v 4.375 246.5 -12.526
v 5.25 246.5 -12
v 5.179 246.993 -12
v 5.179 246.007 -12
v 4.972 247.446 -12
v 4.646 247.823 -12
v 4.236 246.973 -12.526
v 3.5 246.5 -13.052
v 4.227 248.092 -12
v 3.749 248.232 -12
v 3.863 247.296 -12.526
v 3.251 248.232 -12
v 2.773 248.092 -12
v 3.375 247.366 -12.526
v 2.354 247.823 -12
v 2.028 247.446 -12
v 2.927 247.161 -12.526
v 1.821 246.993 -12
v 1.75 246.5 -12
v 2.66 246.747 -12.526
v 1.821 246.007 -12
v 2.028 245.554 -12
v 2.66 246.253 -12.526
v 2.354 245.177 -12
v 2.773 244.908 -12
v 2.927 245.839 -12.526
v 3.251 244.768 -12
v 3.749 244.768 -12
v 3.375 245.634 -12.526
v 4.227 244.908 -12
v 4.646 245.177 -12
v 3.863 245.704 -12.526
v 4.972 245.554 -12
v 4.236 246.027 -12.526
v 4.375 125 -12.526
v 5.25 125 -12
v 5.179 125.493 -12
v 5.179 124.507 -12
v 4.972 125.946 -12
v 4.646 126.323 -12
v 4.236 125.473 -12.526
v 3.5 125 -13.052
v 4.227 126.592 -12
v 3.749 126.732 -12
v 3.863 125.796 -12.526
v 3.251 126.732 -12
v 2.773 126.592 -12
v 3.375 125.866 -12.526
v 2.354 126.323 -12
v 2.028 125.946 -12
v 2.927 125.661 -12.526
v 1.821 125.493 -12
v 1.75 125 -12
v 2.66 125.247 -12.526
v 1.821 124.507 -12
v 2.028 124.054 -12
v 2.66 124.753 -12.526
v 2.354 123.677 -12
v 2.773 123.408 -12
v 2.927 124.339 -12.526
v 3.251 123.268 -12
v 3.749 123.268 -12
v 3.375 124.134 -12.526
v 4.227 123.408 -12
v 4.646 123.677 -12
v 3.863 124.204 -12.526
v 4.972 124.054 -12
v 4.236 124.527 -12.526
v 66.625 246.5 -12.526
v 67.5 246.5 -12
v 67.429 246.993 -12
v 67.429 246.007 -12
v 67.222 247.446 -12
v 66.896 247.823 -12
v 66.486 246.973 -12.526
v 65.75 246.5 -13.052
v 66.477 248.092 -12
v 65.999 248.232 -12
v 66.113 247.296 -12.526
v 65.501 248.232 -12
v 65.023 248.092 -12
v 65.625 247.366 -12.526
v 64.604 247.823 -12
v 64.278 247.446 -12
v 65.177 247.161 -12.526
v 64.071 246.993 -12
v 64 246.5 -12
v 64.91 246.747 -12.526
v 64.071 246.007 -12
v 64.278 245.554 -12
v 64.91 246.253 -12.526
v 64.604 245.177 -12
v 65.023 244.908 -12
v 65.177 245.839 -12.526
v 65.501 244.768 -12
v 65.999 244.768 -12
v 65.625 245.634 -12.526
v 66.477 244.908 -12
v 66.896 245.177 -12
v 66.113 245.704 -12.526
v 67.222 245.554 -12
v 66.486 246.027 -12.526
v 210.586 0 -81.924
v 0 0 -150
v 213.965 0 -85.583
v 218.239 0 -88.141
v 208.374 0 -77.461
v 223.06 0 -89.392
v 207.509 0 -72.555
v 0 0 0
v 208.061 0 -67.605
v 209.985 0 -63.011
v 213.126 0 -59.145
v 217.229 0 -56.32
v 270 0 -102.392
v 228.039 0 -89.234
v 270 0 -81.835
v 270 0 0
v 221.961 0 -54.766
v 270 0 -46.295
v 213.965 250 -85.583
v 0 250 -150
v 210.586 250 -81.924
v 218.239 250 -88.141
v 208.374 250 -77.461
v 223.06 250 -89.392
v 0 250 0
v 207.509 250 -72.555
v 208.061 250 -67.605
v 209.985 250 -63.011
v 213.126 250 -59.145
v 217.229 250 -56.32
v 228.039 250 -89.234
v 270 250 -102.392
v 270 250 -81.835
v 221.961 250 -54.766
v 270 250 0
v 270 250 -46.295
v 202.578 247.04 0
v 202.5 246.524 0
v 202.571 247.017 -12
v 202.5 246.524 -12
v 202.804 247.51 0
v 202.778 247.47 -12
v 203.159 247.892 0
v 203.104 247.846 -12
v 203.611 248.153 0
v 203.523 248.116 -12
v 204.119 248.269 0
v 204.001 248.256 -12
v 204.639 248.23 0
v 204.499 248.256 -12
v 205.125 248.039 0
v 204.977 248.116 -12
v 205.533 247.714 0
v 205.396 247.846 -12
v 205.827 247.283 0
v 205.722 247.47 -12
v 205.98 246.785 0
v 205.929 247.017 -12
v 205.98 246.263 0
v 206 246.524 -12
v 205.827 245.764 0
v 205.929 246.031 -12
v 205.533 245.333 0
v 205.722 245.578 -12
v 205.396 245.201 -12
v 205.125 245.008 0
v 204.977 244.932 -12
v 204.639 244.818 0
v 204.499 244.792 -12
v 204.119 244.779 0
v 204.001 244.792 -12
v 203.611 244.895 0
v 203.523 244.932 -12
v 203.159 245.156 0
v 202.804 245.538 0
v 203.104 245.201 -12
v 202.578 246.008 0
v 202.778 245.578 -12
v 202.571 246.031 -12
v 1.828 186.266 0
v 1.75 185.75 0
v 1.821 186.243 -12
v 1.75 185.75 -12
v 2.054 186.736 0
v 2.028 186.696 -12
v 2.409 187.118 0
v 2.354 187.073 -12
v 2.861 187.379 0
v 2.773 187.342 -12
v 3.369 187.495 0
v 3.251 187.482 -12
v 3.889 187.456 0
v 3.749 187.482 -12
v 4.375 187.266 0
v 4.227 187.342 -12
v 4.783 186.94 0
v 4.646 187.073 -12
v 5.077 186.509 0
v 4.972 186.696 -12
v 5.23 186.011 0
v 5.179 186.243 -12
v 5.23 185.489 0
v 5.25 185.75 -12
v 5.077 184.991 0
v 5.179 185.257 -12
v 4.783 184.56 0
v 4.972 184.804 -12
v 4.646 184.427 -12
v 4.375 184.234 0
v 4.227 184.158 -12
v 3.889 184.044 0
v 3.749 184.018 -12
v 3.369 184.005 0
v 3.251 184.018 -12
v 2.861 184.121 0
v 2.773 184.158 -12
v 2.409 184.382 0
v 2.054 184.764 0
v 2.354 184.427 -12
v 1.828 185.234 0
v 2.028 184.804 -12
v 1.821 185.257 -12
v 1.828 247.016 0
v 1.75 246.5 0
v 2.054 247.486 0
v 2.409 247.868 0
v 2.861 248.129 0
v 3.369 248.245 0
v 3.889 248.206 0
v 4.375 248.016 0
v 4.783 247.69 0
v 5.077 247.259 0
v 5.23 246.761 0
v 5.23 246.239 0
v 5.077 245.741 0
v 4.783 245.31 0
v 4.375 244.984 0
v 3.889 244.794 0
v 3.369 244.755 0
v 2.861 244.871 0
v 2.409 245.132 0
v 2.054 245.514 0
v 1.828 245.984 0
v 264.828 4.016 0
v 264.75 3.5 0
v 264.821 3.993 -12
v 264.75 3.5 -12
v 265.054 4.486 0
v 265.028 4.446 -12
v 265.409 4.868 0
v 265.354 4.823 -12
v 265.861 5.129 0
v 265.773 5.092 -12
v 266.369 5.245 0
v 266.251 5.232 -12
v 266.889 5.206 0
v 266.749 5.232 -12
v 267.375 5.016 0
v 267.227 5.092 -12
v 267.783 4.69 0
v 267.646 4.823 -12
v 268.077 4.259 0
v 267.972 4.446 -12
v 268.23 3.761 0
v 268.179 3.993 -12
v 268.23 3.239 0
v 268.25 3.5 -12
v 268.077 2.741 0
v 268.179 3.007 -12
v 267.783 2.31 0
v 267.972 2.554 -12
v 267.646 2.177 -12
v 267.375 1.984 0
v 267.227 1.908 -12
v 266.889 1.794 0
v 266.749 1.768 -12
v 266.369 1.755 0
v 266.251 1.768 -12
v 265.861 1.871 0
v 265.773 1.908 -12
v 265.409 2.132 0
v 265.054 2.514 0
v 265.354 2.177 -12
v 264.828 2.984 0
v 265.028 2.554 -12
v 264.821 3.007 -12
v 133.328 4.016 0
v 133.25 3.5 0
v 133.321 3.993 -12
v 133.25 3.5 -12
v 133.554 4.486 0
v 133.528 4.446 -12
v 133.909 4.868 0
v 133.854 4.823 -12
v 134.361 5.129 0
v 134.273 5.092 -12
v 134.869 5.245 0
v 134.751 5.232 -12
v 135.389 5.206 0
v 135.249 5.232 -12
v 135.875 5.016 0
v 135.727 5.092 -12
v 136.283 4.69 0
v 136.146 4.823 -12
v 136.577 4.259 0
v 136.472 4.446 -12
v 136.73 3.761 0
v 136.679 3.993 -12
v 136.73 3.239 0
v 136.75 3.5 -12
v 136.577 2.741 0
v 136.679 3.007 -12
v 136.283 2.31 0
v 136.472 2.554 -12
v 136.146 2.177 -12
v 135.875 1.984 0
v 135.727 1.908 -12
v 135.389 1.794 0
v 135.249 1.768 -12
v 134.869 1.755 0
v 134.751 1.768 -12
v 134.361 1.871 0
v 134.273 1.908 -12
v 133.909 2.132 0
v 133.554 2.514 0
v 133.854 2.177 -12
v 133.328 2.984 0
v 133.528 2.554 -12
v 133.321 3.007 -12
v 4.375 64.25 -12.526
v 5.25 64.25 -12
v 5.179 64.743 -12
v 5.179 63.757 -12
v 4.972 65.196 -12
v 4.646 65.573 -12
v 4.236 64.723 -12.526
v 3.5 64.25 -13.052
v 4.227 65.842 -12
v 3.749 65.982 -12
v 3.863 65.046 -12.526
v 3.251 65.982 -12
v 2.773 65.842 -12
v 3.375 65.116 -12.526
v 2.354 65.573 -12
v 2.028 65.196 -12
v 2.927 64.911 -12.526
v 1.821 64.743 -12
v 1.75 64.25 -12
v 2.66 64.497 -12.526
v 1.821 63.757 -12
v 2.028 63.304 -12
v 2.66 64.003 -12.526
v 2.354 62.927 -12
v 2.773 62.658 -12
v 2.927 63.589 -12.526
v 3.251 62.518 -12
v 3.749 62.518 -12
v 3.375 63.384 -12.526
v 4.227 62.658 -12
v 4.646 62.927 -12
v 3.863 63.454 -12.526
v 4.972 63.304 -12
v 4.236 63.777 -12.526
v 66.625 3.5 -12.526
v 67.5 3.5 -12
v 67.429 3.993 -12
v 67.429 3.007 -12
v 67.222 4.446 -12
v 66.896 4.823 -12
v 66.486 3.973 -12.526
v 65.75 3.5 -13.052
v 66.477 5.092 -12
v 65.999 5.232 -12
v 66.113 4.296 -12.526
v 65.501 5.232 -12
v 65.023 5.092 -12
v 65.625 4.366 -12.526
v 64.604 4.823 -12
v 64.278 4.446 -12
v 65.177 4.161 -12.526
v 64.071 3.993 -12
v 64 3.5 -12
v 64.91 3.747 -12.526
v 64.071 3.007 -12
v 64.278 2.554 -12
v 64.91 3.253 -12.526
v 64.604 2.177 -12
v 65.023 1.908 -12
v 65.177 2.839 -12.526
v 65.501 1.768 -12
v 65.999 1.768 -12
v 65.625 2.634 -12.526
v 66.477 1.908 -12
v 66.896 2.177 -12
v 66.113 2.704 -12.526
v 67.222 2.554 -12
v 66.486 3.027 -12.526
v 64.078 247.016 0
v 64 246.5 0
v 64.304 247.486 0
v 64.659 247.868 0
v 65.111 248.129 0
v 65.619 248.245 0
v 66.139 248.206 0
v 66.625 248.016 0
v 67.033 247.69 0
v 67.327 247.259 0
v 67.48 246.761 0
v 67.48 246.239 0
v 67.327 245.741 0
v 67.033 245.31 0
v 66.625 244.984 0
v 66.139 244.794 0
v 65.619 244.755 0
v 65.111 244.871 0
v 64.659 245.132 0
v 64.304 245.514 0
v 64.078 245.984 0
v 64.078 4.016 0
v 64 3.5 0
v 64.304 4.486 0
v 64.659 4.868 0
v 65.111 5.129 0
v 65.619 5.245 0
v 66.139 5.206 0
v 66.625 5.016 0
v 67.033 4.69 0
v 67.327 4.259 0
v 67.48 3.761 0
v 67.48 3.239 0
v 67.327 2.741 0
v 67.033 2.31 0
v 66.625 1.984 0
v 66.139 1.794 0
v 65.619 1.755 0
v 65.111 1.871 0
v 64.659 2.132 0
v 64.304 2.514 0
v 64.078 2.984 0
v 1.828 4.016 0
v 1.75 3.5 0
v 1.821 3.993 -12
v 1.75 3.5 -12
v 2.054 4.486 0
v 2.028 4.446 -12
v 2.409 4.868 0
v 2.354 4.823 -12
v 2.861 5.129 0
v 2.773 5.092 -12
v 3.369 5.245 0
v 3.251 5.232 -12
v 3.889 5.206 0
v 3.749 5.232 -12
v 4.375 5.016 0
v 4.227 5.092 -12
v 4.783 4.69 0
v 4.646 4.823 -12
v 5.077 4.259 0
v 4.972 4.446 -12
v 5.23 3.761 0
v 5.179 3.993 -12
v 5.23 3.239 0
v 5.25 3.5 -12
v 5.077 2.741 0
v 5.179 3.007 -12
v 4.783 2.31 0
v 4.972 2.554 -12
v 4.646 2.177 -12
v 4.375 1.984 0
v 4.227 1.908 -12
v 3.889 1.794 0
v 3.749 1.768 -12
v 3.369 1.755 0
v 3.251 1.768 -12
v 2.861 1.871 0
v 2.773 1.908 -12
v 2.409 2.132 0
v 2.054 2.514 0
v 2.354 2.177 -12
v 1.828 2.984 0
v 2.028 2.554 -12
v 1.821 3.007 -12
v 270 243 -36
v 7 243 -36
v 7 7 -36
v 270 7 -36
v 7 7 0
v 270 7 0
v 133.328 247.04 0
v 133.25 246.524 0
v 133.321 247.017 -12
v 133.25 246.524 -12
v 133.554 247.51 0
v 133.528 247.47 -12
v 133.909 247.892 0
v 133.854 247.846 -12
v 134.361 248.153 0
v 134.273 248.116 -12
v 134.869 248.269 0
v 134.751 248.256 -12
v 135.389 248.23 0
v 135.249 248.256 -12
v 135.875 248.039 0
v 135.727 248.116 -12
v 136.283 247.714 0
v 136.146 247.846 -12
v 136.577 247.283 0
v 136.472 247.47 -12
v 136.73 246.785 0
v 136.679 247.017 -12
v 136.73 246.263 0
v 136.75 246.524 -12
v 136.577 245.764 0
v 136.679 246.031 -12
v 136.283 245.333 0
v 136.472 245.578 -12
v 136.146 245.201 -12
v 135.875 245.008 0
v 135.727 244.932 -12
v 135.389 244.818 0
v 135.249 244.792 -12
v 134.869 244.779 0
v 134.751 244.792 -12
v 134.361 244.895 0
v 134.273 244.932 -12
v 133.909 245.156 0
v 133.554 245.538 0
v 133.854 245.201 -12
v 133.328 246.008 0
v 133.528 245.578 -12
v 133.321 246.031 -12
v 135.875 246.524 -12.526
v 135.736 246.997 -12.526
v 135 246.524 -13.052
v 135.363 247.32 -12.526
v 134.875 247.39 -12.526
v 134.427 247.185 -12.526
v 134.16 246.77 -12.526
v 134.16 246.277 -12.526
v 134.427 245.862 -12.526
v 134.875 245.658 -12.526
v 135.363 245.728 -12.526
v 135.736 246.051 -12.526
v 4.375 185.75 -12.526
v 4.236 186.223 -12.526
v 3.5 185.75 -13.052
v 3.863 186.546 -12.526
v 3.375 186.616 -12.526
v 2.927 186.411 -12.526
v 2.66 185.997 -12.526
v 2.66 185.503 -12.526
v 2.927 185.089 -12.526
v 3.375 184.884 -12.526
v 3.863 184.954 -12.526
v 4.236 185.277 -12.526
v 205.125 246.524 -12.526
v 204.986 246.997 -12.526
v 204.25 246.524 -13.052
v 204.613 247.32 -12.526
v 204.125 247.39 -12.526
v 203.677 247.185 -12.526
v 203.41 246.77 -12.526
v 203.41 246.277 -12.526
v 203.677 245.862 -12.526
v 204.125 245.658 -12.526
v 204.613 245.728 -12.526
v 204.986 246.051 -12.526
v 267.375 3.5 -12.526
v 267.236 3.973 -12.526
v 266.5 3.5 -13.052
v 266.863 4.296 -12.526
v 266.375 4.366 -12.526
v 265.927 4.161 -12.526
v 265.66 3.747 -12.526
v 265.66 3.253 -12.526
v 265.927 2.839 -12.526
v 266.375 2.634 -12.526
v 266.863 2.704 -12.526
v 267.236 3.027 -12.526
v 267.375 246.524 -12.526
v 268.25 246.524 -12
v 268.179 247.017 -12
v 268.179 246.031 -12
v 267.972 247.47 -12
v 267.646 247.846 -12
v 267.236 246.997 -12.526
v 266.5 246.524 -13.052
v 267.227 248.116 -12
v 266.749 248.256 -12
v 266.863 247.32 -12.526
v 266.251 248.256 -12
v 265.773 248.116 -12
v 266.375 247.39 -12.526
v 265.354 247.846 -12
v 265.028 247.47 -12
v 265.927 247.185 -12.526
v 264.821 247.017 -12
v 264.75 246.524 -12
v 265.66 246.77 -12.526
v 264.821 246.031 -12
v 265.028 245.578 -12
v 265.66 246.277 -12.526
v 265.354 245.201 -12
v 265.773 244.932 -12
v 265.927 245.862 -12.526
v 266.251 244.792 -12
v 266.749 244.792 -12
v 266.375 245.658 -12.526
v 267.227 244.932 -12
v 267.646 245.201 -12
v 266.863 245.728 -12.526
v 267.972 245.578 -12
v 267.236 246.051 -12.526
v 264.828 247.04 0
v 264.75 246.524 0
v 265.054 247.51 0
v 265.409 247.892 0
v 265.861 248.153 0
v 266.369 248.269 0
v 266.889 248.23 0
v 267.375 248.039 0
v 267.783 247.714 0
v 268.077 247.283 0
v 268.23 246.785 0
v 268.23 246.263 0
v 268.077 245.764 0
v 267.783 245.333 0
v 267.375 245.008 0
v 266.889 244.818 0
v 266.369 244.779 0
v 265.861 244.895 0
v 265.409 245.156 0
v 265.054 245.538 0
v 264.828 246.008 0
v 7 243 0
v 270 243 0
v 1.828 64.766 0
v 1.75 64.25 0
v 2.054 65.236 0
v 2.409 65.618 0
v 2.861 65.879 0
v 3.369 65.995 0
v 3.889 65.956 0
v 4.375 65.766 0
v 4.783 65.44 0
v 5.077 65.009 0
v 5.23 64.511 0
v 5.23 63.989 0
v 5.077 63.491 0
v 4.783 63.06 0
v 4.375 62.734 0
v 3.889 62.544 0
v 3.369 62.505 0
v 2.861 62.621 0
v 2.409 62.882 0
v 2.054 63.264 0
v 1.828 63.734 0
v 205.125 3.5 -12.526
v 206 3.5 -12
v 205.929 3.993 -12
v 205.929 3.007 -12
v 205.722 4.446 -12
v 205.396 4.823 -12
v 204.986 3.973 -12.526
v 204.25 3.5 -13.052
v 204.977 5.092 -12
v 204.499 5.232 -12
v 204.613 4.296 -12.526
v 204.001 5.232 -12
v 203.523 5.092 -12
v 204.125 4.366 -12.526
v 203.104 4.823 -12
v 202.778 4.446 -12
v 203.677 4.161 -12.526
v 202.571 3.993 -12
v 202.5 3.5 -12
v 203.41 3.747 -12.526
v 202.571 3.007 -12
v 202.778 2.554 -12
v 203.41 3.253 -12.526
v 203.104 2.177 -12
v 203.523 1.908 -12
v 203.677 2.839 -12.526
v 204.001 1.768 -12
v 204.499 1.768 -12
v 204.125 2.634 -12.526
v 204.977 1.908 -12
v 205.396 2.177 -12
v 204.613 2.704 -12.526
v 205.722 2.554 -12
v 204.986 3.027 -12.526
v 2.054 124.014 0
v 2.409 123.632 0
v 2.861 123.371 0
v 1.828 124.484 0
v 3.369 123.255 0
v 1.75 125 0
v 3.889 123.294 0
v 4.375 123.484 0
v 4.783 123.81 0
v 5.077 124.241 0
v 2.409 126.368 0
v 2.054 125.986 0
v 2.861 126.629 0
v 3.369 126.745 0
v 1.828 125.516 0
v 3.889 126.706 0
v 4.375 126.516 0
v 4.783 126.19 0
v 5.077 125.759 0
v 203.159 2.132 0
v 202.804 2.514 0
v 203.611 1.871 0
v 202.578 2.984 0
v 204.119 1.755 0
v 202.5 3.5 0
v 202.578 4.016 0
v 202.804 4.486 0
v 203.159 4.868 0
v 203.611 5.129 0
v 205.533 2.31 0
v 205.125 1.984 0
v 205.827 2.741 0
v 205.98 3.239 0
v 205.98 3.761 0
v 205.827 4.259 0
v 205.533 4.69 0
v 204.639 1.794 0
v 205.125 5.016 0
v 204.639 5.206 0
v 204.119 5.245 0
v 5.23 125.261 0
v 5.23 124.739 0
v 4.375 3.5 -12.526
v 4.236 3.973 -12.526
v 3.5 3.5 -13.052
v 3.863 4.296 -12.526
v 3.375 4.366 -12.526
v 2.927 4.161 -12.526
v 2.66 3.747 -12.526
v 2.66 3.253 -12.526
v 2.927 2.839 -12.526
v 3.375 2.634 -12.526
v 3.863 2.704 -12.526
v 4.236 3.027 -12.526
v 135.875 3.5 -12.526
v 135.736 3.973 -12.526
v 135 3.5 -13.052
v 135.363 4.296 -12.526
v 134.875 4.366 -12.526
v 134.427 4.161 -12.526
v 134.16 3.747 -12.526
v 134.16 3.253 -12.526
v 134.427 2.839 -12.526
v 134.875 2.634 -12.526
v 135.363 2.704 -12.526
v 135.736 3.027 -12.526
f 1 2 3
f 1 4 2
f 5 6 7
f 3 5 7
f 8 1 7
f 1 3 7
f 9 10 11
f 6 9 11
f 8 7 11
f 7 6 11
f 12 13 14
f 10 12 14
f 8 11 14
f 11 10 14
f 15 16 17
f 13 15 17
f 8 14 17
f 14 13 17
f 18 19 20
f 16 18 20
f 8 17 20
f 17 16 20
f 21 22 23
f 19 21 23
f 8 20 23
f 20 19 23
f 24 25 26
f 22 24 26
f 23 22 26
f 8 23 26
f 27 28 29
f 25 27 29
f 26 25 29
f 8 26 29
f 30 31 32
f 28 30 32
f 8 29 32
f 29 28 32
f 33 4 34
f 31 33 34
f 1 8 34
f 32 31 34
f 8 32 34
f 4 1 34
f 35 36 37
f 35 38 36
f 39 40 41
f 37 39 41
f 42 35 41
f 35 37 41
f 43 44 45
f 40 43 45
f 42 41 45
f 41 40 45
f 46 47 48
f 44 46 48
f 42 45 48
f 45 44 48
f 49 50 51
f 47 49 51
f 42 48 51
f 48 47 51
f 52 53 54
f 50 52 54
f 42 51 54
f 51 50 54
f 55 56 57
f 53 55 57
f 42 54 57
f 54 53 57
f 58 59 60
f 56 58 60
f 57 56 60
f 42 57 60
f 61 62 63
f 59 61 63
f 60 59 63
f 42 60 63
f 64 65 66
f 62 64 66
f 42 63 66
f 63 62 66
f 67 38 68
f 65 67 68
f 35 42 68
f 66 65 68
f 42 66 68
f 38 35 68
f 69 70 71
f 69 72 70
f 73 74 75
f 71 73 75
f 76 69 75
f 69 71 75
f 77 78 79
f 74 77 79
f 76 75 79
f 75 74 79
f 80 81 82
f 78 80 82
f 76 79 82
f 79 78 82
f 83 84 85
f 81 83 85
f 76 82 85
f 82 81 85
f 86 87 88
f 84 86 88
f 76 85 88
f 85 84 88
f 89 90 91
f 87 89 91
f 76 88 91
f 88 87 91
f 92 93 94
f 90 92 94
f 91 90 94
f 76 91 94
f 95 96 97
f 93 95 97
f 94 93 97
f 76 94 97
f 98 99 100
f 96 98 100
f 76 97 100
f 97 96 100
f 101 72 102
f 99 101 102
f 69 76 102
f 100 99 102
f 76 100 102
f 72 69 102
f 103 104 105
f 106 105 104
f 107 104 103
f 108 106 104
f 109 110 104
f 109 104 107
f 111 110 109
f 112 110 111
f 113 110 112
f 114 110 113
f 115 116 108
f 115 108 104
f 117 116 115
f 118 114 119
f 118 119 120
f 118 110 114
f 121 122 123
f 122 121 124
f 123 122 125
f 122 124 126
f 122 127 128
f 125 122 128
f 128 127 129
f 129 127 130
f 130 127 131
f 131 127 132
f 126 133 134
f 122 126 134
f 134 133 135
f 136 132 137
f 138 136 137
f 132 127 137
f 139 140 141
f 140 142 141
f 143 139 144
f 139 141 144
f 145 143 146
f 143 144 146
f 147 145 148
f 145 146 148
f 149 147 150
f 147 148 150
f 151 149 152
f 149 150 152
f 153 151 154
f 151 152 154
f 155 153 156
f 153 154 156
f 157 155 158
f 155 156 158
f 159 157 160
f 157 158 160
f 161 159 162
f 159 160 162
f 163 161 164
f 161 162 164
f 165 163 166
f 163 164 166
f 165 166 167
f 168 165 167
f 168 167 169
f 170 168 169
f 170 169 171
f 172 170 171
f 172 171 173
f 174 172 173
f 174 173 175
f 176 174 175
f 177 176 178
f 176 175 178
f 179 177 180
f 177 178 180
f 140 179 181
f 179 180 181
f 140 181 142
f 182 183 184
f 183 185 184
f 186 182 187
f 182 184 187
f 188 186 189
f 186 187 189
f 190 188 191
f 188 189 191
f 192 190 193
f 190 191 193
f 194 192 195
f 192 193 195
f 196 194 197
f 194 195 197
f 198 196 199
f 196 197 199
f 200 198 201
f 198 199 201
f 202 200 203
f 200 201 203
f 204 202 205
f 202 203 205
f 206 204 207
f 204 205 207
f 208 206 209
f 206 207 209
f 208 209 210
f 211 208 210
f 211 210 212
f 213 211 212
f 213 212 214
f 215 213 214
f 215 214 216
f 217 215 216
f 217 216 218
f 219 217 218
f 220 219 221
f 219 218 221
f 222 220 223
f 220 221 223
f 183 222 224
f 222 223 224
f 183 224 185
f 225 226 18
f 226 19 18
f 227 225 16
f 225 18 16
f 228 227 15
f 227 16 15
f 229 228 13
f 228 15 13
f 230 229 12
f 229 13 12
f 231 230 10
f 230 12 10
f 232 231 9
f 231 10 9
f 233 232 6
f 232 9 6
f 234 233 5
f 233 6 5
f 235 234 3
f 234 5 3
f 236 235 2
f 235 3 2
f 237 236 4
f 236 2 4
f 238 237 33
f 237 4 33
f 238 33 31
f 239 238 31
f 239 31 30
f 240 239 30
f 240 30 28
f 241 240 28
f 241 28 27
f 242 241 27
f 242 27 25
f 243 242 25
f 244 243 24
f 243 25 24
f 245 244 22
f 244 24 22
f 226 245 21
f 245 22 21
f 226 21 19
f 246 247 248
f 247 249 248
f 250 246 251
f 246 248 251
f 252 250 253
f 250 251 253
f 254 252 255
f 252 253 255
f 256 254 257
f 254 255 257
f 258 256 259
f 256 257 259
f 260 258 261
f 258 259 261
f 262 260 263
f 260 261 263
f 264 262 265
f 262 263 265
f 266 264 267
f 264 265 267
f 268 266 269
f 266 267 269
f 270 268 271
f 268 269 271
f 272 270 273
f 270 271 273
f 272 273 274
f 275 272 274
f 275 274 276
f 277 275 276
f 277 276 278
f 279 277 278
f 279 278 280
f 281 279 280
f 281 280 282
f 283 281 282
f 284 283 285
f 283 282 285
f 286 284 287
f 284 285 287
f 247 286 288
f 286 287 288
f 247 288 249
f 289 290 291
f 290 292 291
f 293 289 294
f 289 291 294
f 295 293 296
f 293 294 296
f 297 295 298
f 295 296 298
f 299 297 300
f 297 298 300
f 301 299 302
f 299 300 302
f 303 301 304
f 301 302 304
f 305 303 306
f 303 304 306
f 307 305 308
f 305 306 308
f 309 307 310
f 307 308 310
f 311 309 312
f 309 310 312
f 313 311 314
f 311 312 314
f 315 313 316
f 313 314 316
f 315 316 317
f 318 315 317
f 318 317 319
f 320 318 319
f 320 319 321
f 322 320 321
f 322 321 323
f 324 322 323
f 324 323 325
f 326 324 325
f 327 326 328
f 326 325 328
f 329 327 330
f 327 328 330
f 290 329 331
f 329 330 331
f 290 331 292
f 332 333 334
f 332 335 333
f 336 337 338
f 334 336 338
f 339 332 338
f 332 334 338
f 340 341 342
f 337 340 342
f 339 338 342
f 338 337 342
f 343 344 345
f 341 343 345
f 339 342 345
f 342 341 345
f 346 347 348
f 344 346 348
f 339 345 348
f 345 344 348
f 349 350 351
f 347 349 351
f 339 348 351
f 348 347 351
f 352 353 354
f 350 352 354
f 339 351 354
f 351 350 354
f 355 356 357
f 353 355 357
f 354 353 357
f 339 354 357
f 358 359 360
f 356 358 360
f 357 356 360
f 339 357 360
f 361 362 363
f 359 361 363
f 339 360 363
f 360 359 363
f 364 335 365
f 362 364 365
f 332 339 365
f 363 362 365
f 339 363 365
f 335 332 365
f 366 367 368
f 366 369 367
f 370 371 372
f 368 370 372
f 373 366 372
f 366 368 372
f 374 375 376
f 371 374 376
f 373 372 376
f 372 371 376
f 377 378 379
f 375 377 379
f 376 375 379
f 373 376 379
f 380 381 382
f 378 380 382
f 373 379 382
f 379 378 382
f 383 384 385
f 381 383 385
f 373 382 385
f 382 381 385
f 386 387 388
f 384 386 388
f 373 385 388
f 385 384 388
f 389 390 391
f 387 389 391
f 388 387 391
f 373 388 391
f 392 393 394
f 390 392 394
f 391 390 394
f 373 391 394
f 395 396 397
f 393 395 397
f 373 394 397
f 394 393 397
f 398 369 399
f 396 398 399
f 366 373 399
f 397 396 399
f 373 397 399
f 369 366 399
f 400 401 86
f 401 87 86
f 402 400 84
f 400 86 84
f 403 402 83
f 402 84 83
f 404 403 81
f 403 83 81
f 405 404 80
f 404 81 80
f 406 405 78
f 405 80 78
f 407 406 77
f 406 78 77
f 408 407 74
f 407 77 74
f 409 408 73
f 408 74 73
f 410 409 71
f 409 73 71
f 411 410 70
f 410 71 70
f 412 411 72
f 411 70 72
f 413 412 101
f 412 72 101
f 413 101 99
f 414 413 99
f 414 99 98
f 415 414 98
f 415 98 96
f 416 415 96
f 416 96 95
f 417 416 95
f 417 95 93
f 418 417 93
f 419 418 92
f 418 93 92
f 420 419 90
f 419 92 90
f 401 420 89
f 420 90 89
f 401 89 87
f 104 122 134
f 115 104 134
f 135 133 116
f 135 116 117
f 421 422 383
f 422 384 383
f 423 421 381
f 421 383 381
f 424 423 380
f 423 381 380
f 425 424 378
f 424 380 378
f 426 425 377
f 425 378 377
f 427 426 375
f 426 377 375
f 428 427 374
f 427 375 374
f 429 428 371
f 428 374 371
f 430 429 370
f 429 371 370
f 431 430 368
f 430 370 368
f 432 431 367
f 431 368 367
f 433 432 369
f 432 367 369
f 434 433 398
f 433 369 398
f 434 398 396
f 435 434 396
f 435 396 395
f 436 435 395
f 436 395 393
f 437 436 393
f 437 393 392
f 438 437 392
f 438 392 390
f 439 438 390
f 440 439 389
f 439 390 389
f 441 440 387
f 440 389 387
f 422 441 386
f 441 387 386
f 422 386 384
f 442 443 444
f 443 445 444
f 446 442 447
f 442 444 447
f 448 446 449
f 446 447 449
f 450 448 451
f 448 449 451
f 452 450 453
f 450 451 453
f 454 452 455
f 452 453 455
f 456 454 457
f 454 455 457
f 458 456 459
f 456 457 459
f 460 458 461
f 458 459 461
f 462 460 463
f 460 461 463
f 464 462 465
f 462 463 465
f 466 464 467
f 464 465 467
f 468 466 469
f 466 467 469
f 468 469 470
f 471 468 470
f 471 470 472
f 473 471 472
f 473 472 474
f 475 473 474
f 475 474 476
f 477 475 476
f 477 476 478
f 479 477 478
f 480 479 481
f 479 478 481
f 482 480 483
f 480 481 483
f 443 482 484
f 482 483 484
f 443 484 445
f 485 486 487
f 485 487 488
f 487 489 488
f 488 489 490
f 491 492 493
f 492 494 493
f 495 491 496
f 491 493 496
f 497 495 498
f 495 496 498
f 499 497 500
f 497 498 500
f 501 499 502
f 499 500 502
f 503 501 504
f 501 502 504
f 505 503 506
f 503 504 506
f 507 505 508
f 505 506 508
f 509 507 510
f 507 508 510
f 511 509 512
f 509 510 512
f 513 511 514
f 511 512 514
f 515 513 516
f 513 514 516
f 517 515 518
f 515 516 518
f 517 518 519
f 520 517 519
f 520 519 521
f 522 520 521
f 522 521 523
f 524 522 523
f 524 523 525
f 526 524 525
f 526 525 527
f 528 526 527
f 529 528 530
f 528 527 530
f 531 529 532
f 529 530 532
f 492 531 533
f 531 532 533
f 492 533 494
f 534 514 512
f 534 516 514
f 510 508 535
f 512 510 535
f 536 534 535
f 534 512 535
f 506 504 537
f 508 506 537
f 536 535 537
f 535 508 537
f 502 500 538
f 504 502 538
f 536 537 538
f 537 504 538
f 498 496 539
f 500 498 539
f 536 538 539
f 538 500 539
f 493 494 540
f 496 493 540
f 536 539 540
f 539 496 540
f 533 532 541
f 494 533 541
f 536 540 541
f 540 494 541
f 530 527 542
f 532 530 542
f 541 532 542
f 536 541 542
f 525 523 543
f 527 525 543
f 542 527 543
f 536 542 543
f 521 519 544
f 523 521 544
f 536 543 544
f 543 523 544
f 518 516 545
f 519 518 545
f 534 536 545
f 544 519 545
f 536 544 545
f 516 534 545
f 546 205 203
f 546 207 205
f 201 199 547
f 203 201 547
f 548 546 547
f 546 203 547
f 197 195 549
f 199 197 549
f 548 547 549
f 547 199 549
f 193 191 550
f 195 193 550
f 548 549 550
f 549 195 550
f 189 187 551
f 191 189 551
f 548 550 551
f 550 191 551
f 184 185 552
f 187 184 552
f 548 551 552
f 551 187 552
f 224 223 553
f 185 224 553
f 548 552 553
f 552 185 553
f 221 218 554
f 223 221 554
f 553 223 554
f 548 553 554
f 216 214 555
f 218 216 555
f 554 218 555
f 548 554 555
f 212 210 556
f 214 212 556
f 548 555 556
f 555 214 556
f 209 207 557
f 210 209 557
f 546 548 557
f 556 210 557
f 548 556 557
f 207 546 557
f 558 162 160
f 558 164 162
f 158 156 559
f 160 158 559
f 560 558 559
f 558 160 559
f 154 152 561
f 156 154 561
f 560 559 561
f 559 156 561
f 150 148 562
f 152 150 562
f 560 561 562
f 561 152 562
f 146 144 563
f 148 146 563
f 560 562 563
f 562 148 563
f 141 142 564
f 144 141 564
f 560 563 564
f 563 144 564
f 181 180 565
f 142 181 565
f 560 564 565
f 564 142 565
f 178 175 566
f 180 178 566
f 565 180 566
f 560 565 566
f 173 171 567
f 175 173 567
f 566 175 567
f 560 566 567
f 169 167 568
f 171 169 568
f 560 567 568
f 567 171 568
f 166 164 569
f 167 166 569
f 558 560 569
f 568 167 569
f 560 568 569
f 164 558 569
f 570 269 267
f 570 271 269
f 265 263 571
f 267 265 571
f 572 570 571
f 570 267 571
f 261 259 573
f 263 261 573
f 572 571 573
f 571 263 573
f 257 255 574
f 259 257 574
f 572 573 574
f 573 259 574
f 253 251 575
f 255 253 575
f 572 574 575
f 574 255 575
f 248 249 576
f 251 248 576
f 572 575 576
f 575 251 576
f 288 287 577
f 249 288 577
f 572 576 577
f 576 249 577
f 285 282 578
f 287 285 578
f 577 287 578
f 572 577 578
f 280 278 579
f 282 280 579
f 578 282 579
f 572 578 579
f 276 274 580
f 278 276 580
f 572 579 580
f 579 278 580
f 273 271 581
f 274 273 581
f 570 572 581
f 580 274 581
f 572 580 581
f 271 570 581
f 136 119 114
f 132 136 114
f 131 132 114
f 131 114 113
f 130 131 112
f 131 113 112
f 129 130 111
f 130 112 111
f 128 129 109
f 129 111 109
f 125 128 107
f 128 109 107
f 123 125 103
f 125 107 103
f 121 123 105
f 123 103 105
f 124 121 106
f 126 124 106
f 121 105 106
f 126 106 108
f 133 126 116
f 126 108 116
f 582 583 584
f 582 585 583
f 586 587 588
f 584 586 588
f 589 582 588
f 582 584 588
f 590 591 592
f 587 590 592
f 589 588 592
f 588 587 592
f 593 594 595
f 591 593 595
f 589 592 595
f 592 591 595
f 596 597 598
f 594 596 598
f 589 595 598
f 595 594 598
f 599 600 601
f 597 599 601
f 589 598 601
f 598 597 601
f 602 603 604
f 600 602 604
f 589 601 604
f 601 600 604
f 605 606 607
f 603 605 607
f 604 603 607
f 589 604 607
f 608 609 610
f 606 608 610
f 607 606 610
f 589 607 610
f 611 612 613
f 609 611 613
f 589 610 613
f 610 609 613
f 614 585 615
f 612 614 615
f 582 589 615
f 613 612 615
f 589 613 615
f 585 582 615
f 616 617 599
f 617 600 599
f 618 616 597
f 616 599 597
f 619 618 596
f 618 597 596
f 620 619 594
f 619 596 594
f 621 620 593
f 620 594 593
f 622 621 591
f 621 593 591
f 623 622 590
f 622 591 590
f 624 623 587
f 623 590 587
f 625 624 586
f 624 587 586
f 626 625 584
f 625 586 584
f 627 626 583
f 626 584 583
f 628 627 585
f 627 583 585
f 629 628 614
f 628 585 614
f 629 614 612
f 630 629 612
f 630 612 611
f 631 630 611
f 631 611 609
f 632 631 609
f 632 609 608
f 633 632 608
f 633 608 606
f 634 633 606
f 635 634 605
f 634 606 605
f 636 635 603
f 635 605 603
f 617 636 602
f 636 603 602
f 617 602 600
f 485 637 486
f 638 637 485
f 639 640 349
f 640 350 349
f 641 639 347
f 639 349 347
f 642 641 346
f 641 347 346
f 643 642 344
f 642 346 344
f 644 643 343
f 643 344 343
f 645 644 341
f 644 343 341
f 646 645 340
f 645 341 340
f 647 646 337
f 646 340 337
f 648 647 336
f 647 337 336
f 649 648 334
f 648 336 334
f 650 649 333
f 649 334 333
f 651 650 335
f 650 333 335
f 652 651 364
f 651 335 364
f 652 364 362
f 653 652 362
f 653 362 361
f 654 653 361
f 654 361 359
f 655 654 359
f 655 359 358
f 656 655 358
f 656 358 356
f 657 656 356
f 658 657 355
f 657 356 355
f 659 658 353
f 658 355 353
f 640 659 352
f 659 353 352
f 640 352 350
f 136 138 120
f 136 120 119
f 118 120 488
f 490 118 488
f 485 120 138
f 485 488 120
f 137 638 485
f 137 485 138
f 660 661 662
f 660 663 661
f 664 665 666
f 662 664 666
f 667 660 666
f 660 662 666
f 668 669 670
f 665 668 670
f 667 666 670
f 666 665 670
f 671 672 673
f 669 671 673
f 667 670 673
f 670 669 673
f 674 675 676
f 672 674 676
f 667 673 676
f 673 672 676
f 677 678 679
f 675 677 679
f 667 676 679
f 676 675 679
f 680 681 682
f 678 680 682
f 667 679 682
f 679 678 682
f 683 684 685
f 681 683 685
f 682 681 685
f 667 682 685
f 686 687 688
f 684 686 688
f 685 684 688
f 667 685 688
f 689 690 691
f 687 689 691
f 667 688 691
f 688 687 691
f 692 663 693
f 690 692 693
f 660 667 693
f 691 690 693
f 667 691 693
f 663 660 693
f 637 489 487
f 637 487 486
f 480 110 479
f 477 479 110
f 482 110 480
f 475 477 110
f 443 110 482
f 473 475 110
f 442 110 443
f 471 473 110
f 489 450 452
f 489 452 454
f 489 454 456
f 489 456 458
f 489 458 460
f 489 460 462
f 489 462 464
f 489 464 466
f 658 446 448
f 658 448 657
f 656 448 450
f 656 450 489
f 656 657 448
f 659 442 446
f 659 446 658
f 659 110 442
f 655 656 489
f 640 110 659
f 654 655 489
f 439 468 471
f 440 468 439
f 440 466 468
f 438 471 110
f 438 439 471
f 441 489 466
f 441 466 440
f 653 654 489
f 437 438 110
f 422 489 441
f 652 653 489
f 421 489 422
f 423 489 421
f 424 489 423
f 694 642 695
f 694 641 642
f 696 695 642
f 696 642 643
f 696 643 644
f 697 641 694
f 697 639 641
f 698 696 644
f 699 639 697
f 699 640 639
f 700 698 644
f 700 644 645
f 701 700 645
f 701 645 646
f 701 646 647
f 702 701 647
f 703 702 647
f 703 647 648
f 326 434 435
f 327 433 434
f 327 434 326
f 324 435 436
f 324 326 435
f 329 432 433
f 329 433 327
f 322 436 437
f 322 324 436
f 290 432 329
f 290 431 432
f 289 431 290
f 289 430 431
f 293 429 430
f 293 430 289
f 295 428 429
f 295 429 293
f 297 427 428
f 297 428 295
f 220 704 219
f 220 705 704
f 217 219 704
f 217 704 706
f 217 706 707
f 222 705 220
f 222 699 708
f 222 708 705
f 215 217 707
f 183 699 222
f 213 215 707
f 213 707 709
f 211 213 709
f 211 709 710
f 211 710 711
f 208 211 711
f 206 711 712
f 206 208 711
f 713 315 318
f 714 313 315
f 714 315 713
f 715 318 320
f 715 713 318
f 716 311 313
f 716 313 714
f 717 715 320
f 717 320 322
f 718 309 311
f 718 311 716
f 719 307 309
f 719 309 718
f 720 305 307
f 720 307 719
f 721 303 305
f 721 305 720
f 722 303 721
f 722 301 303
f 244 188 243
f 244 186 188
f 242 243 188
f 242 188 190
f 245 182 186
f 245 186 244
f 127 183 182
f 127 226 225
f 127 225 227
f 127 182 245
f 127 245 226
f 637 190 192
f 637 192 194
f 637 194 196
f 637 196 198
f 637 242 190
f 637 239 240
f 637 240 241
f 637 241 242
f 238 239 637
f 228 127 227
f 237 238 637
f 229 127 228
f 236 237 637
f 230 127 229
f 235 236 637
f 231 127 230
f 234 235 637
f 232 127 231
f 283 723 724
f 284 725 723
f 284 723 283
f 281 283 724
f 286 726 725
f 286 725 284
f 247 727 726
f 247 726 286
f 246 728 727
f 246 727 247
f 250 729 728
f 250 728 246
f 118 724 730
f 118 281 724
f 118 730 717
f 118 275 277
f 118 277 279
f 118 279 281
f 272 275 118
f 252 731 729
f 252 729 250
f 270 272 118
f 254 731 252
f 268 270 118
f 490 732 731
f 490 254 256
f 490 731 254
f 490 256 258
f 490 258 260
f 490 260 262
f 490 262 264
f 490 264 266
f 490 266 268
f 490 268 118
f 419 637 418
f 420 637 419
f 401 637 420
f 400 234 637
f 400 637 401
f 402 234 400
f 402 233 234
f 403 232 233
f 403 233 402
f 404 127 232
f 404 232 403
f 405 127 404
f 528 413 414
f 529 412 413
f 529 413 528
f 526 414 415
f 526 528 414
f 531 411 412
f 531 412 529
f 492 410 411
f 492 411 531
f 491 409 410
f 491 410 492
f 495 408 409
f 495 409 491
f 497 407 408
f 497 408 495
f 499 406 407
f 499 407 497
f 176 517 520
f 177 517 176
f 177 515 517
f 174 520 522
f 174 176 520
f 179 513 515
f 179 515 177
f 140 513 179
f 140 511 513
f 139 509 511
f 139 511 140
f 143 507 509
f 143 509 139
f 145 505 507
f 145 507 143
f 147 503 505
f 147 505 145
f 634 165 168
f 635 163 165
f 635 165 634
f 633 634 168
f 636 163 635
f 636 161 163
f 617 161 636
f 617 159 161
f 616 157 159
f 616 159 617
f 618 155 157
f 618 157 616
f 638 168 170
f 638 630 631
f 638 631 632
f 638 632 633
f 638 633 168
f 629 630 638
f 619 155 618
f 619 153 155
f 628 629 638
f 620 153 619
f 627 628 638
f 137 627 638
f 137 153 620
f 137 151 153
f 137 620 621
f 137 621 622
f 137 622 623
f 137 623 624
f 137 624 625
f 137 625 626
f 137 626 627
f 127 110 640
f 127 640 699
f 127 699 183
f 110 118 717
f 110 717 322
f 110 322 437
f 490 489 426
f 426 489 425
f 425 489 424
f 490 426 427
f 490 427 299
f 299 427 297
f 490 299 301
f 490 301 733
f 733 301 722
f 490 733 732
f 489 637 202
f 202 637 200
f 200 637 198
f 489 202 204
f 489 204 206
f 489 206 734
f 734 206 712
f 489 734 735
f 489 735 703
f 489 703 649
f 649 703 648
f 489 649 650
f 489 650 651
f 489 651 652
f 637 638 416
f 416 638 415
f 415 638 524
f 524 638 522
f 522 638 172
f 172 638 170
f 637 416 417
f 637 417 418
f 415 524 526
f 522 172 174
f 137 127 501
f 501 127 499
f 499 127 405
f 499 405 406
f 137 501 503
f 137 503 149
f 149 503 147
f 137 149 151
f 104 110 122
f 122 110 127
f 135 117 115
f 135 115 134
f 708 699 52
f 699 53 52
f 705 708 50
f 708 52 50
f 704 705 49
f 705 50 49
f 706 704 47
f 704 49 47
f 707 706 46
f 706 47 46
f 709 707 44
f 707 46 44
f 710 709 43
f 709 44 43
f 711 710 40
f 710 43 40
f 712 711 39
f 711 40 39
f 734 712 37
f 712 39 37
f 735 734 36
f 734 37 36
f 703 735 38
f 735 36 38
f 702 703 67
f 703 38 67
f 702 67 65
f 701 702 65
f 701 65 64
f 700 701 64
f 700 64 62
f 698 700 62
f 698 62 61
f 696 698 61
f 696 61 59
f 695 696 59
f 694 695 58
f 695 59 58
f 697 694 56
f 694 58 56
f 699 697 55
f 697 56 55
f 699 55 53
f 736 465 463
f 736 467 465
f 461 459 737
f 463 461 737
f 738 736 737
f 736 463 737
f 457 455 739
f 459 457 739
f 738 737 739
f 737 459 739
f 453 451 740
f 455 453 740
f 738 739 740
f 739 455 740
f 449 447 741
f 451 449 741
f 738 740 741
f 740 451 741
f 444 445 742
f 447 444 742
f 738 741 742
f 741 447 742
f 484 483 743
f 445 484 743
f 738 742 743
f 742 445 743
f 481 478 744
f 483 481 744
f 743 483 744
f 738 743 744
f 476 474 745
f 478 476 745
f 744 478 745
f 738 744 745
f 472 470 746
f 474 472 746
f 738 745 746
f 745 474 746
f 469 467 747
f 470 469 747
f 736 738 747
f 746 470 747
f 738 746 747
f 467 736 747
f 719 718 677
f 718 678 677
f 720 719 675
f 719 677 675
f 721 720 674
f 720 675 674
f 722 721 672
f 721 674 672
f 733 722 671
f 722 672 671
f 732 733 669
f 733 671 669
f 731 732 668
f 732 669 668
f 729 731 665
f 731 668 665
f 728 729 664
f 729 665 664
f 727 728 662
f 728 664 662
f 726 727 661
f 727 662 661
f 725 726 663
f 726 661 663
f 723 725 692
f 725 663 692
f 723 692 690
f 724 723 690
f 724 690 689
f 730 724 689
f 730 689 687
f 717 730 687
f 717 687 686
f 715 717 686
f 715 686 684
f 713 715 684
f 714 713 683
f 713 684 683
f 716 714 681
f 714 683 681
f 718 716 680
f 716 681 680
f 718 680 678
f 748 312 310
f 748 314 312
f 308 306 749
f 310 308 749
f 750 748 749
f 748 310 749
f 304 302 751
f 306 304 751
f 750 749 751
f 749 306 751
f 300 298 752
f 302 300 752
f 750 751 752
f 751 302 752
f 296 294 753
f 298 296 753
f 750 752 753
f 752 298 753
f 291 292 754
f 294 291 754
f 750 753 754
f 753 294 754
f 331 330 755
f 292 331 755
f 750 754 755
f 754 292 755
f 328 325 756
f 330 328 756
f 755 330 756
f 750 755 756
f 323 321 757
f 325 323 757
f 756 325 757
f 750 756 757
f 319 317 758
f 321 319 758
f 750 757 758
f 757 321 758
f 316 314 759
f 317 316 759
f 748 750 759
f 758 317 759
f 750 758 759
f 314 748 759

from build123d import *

# Parameters (mm, degrees)
F0_W      = 270
F0_H      = 250
F4_REACH  = 517.9673898595
F5_W      = 263
F5_H      = 236
F6_DEPTH  = 36
F8_DEPTH  = 250.001
F10_D     = 3.5
F10_DEPTH = 12
F10_TIP   = 1.0515060833


with BuildPart() as f4:
    f4_end = Plane(origin=(25.6515107494, 0, -145.4769465589), x_dir=(0.984807753, 0, 0.1736481777), z_dir=(-0.1736481777, 0, 0.984807753))
    # F0 (on Top) → F4 (new body, up to a plane its end follows)
    with BuildSketch(Plane.XY):
        with Locations((135, 125)):
            Rectangle(F0_W, F0_H)
    f4_long = extrude(amount=-F4_REACH, mode=Mode.PRIVATE)
    add(split(f4_long, bisect_by=f4_end, keep=Keep.TOP, mode=Mode.PRIVATE))

    # F5 (on face) → F6 (cut)
    with BuildSketch(Plane.XY):
        with Locations((138.5, 125)):
            Rectangle(F5_W, F5_H)
    extrude(amount=-F6_DEPTH, mode=Mode.SUBTRACT)

    # F7 (on face) → F8 (cut, through all)
    with BuildSketch(Plane.XZ):
        with BuildLine():
            Line((270, -46.2953201601), (221.9611568908, -54.7658643223))
            ThreePointArc((221.9611568908, -54.7658643223), (207.7658643223, -75.0388431092), (228.0388431092, -89.2341356777))
            Line((228.0388431092, -89.2341356777), (270, -81.8352515761))
            Line((270, -81.8352515761), (270, -46.2953201601))
        make_face()
    extrude(amount=-F8_DEPTH, mode=Mode.SUBTRACT)

    # F10
    with Locations(Plane.XY):
        with Locations((3.5, 64.25), (3.5, 125), (3.5, 185.75), (3.5, 246.5), (3.5, 3.5), (65.75, 3.5), (135, 3.5), (204.25, 3.5), (266.5, 3.5), (266.500000929, 246.5237677097), (204.25, 246.5237677097), (135, 246.5237677097), (65.75, 246.5)):
            Hole(F10_D / 2, depth=F10_DEPTH)
            with Locations((0, 0, -(F10_DEPTH + F10_TIP / 2))):  # 118° drill point
                Cone(0, F10_D / 2, F10_TIP, mode=Mode.SUBTRACT)


solid = f4.part
